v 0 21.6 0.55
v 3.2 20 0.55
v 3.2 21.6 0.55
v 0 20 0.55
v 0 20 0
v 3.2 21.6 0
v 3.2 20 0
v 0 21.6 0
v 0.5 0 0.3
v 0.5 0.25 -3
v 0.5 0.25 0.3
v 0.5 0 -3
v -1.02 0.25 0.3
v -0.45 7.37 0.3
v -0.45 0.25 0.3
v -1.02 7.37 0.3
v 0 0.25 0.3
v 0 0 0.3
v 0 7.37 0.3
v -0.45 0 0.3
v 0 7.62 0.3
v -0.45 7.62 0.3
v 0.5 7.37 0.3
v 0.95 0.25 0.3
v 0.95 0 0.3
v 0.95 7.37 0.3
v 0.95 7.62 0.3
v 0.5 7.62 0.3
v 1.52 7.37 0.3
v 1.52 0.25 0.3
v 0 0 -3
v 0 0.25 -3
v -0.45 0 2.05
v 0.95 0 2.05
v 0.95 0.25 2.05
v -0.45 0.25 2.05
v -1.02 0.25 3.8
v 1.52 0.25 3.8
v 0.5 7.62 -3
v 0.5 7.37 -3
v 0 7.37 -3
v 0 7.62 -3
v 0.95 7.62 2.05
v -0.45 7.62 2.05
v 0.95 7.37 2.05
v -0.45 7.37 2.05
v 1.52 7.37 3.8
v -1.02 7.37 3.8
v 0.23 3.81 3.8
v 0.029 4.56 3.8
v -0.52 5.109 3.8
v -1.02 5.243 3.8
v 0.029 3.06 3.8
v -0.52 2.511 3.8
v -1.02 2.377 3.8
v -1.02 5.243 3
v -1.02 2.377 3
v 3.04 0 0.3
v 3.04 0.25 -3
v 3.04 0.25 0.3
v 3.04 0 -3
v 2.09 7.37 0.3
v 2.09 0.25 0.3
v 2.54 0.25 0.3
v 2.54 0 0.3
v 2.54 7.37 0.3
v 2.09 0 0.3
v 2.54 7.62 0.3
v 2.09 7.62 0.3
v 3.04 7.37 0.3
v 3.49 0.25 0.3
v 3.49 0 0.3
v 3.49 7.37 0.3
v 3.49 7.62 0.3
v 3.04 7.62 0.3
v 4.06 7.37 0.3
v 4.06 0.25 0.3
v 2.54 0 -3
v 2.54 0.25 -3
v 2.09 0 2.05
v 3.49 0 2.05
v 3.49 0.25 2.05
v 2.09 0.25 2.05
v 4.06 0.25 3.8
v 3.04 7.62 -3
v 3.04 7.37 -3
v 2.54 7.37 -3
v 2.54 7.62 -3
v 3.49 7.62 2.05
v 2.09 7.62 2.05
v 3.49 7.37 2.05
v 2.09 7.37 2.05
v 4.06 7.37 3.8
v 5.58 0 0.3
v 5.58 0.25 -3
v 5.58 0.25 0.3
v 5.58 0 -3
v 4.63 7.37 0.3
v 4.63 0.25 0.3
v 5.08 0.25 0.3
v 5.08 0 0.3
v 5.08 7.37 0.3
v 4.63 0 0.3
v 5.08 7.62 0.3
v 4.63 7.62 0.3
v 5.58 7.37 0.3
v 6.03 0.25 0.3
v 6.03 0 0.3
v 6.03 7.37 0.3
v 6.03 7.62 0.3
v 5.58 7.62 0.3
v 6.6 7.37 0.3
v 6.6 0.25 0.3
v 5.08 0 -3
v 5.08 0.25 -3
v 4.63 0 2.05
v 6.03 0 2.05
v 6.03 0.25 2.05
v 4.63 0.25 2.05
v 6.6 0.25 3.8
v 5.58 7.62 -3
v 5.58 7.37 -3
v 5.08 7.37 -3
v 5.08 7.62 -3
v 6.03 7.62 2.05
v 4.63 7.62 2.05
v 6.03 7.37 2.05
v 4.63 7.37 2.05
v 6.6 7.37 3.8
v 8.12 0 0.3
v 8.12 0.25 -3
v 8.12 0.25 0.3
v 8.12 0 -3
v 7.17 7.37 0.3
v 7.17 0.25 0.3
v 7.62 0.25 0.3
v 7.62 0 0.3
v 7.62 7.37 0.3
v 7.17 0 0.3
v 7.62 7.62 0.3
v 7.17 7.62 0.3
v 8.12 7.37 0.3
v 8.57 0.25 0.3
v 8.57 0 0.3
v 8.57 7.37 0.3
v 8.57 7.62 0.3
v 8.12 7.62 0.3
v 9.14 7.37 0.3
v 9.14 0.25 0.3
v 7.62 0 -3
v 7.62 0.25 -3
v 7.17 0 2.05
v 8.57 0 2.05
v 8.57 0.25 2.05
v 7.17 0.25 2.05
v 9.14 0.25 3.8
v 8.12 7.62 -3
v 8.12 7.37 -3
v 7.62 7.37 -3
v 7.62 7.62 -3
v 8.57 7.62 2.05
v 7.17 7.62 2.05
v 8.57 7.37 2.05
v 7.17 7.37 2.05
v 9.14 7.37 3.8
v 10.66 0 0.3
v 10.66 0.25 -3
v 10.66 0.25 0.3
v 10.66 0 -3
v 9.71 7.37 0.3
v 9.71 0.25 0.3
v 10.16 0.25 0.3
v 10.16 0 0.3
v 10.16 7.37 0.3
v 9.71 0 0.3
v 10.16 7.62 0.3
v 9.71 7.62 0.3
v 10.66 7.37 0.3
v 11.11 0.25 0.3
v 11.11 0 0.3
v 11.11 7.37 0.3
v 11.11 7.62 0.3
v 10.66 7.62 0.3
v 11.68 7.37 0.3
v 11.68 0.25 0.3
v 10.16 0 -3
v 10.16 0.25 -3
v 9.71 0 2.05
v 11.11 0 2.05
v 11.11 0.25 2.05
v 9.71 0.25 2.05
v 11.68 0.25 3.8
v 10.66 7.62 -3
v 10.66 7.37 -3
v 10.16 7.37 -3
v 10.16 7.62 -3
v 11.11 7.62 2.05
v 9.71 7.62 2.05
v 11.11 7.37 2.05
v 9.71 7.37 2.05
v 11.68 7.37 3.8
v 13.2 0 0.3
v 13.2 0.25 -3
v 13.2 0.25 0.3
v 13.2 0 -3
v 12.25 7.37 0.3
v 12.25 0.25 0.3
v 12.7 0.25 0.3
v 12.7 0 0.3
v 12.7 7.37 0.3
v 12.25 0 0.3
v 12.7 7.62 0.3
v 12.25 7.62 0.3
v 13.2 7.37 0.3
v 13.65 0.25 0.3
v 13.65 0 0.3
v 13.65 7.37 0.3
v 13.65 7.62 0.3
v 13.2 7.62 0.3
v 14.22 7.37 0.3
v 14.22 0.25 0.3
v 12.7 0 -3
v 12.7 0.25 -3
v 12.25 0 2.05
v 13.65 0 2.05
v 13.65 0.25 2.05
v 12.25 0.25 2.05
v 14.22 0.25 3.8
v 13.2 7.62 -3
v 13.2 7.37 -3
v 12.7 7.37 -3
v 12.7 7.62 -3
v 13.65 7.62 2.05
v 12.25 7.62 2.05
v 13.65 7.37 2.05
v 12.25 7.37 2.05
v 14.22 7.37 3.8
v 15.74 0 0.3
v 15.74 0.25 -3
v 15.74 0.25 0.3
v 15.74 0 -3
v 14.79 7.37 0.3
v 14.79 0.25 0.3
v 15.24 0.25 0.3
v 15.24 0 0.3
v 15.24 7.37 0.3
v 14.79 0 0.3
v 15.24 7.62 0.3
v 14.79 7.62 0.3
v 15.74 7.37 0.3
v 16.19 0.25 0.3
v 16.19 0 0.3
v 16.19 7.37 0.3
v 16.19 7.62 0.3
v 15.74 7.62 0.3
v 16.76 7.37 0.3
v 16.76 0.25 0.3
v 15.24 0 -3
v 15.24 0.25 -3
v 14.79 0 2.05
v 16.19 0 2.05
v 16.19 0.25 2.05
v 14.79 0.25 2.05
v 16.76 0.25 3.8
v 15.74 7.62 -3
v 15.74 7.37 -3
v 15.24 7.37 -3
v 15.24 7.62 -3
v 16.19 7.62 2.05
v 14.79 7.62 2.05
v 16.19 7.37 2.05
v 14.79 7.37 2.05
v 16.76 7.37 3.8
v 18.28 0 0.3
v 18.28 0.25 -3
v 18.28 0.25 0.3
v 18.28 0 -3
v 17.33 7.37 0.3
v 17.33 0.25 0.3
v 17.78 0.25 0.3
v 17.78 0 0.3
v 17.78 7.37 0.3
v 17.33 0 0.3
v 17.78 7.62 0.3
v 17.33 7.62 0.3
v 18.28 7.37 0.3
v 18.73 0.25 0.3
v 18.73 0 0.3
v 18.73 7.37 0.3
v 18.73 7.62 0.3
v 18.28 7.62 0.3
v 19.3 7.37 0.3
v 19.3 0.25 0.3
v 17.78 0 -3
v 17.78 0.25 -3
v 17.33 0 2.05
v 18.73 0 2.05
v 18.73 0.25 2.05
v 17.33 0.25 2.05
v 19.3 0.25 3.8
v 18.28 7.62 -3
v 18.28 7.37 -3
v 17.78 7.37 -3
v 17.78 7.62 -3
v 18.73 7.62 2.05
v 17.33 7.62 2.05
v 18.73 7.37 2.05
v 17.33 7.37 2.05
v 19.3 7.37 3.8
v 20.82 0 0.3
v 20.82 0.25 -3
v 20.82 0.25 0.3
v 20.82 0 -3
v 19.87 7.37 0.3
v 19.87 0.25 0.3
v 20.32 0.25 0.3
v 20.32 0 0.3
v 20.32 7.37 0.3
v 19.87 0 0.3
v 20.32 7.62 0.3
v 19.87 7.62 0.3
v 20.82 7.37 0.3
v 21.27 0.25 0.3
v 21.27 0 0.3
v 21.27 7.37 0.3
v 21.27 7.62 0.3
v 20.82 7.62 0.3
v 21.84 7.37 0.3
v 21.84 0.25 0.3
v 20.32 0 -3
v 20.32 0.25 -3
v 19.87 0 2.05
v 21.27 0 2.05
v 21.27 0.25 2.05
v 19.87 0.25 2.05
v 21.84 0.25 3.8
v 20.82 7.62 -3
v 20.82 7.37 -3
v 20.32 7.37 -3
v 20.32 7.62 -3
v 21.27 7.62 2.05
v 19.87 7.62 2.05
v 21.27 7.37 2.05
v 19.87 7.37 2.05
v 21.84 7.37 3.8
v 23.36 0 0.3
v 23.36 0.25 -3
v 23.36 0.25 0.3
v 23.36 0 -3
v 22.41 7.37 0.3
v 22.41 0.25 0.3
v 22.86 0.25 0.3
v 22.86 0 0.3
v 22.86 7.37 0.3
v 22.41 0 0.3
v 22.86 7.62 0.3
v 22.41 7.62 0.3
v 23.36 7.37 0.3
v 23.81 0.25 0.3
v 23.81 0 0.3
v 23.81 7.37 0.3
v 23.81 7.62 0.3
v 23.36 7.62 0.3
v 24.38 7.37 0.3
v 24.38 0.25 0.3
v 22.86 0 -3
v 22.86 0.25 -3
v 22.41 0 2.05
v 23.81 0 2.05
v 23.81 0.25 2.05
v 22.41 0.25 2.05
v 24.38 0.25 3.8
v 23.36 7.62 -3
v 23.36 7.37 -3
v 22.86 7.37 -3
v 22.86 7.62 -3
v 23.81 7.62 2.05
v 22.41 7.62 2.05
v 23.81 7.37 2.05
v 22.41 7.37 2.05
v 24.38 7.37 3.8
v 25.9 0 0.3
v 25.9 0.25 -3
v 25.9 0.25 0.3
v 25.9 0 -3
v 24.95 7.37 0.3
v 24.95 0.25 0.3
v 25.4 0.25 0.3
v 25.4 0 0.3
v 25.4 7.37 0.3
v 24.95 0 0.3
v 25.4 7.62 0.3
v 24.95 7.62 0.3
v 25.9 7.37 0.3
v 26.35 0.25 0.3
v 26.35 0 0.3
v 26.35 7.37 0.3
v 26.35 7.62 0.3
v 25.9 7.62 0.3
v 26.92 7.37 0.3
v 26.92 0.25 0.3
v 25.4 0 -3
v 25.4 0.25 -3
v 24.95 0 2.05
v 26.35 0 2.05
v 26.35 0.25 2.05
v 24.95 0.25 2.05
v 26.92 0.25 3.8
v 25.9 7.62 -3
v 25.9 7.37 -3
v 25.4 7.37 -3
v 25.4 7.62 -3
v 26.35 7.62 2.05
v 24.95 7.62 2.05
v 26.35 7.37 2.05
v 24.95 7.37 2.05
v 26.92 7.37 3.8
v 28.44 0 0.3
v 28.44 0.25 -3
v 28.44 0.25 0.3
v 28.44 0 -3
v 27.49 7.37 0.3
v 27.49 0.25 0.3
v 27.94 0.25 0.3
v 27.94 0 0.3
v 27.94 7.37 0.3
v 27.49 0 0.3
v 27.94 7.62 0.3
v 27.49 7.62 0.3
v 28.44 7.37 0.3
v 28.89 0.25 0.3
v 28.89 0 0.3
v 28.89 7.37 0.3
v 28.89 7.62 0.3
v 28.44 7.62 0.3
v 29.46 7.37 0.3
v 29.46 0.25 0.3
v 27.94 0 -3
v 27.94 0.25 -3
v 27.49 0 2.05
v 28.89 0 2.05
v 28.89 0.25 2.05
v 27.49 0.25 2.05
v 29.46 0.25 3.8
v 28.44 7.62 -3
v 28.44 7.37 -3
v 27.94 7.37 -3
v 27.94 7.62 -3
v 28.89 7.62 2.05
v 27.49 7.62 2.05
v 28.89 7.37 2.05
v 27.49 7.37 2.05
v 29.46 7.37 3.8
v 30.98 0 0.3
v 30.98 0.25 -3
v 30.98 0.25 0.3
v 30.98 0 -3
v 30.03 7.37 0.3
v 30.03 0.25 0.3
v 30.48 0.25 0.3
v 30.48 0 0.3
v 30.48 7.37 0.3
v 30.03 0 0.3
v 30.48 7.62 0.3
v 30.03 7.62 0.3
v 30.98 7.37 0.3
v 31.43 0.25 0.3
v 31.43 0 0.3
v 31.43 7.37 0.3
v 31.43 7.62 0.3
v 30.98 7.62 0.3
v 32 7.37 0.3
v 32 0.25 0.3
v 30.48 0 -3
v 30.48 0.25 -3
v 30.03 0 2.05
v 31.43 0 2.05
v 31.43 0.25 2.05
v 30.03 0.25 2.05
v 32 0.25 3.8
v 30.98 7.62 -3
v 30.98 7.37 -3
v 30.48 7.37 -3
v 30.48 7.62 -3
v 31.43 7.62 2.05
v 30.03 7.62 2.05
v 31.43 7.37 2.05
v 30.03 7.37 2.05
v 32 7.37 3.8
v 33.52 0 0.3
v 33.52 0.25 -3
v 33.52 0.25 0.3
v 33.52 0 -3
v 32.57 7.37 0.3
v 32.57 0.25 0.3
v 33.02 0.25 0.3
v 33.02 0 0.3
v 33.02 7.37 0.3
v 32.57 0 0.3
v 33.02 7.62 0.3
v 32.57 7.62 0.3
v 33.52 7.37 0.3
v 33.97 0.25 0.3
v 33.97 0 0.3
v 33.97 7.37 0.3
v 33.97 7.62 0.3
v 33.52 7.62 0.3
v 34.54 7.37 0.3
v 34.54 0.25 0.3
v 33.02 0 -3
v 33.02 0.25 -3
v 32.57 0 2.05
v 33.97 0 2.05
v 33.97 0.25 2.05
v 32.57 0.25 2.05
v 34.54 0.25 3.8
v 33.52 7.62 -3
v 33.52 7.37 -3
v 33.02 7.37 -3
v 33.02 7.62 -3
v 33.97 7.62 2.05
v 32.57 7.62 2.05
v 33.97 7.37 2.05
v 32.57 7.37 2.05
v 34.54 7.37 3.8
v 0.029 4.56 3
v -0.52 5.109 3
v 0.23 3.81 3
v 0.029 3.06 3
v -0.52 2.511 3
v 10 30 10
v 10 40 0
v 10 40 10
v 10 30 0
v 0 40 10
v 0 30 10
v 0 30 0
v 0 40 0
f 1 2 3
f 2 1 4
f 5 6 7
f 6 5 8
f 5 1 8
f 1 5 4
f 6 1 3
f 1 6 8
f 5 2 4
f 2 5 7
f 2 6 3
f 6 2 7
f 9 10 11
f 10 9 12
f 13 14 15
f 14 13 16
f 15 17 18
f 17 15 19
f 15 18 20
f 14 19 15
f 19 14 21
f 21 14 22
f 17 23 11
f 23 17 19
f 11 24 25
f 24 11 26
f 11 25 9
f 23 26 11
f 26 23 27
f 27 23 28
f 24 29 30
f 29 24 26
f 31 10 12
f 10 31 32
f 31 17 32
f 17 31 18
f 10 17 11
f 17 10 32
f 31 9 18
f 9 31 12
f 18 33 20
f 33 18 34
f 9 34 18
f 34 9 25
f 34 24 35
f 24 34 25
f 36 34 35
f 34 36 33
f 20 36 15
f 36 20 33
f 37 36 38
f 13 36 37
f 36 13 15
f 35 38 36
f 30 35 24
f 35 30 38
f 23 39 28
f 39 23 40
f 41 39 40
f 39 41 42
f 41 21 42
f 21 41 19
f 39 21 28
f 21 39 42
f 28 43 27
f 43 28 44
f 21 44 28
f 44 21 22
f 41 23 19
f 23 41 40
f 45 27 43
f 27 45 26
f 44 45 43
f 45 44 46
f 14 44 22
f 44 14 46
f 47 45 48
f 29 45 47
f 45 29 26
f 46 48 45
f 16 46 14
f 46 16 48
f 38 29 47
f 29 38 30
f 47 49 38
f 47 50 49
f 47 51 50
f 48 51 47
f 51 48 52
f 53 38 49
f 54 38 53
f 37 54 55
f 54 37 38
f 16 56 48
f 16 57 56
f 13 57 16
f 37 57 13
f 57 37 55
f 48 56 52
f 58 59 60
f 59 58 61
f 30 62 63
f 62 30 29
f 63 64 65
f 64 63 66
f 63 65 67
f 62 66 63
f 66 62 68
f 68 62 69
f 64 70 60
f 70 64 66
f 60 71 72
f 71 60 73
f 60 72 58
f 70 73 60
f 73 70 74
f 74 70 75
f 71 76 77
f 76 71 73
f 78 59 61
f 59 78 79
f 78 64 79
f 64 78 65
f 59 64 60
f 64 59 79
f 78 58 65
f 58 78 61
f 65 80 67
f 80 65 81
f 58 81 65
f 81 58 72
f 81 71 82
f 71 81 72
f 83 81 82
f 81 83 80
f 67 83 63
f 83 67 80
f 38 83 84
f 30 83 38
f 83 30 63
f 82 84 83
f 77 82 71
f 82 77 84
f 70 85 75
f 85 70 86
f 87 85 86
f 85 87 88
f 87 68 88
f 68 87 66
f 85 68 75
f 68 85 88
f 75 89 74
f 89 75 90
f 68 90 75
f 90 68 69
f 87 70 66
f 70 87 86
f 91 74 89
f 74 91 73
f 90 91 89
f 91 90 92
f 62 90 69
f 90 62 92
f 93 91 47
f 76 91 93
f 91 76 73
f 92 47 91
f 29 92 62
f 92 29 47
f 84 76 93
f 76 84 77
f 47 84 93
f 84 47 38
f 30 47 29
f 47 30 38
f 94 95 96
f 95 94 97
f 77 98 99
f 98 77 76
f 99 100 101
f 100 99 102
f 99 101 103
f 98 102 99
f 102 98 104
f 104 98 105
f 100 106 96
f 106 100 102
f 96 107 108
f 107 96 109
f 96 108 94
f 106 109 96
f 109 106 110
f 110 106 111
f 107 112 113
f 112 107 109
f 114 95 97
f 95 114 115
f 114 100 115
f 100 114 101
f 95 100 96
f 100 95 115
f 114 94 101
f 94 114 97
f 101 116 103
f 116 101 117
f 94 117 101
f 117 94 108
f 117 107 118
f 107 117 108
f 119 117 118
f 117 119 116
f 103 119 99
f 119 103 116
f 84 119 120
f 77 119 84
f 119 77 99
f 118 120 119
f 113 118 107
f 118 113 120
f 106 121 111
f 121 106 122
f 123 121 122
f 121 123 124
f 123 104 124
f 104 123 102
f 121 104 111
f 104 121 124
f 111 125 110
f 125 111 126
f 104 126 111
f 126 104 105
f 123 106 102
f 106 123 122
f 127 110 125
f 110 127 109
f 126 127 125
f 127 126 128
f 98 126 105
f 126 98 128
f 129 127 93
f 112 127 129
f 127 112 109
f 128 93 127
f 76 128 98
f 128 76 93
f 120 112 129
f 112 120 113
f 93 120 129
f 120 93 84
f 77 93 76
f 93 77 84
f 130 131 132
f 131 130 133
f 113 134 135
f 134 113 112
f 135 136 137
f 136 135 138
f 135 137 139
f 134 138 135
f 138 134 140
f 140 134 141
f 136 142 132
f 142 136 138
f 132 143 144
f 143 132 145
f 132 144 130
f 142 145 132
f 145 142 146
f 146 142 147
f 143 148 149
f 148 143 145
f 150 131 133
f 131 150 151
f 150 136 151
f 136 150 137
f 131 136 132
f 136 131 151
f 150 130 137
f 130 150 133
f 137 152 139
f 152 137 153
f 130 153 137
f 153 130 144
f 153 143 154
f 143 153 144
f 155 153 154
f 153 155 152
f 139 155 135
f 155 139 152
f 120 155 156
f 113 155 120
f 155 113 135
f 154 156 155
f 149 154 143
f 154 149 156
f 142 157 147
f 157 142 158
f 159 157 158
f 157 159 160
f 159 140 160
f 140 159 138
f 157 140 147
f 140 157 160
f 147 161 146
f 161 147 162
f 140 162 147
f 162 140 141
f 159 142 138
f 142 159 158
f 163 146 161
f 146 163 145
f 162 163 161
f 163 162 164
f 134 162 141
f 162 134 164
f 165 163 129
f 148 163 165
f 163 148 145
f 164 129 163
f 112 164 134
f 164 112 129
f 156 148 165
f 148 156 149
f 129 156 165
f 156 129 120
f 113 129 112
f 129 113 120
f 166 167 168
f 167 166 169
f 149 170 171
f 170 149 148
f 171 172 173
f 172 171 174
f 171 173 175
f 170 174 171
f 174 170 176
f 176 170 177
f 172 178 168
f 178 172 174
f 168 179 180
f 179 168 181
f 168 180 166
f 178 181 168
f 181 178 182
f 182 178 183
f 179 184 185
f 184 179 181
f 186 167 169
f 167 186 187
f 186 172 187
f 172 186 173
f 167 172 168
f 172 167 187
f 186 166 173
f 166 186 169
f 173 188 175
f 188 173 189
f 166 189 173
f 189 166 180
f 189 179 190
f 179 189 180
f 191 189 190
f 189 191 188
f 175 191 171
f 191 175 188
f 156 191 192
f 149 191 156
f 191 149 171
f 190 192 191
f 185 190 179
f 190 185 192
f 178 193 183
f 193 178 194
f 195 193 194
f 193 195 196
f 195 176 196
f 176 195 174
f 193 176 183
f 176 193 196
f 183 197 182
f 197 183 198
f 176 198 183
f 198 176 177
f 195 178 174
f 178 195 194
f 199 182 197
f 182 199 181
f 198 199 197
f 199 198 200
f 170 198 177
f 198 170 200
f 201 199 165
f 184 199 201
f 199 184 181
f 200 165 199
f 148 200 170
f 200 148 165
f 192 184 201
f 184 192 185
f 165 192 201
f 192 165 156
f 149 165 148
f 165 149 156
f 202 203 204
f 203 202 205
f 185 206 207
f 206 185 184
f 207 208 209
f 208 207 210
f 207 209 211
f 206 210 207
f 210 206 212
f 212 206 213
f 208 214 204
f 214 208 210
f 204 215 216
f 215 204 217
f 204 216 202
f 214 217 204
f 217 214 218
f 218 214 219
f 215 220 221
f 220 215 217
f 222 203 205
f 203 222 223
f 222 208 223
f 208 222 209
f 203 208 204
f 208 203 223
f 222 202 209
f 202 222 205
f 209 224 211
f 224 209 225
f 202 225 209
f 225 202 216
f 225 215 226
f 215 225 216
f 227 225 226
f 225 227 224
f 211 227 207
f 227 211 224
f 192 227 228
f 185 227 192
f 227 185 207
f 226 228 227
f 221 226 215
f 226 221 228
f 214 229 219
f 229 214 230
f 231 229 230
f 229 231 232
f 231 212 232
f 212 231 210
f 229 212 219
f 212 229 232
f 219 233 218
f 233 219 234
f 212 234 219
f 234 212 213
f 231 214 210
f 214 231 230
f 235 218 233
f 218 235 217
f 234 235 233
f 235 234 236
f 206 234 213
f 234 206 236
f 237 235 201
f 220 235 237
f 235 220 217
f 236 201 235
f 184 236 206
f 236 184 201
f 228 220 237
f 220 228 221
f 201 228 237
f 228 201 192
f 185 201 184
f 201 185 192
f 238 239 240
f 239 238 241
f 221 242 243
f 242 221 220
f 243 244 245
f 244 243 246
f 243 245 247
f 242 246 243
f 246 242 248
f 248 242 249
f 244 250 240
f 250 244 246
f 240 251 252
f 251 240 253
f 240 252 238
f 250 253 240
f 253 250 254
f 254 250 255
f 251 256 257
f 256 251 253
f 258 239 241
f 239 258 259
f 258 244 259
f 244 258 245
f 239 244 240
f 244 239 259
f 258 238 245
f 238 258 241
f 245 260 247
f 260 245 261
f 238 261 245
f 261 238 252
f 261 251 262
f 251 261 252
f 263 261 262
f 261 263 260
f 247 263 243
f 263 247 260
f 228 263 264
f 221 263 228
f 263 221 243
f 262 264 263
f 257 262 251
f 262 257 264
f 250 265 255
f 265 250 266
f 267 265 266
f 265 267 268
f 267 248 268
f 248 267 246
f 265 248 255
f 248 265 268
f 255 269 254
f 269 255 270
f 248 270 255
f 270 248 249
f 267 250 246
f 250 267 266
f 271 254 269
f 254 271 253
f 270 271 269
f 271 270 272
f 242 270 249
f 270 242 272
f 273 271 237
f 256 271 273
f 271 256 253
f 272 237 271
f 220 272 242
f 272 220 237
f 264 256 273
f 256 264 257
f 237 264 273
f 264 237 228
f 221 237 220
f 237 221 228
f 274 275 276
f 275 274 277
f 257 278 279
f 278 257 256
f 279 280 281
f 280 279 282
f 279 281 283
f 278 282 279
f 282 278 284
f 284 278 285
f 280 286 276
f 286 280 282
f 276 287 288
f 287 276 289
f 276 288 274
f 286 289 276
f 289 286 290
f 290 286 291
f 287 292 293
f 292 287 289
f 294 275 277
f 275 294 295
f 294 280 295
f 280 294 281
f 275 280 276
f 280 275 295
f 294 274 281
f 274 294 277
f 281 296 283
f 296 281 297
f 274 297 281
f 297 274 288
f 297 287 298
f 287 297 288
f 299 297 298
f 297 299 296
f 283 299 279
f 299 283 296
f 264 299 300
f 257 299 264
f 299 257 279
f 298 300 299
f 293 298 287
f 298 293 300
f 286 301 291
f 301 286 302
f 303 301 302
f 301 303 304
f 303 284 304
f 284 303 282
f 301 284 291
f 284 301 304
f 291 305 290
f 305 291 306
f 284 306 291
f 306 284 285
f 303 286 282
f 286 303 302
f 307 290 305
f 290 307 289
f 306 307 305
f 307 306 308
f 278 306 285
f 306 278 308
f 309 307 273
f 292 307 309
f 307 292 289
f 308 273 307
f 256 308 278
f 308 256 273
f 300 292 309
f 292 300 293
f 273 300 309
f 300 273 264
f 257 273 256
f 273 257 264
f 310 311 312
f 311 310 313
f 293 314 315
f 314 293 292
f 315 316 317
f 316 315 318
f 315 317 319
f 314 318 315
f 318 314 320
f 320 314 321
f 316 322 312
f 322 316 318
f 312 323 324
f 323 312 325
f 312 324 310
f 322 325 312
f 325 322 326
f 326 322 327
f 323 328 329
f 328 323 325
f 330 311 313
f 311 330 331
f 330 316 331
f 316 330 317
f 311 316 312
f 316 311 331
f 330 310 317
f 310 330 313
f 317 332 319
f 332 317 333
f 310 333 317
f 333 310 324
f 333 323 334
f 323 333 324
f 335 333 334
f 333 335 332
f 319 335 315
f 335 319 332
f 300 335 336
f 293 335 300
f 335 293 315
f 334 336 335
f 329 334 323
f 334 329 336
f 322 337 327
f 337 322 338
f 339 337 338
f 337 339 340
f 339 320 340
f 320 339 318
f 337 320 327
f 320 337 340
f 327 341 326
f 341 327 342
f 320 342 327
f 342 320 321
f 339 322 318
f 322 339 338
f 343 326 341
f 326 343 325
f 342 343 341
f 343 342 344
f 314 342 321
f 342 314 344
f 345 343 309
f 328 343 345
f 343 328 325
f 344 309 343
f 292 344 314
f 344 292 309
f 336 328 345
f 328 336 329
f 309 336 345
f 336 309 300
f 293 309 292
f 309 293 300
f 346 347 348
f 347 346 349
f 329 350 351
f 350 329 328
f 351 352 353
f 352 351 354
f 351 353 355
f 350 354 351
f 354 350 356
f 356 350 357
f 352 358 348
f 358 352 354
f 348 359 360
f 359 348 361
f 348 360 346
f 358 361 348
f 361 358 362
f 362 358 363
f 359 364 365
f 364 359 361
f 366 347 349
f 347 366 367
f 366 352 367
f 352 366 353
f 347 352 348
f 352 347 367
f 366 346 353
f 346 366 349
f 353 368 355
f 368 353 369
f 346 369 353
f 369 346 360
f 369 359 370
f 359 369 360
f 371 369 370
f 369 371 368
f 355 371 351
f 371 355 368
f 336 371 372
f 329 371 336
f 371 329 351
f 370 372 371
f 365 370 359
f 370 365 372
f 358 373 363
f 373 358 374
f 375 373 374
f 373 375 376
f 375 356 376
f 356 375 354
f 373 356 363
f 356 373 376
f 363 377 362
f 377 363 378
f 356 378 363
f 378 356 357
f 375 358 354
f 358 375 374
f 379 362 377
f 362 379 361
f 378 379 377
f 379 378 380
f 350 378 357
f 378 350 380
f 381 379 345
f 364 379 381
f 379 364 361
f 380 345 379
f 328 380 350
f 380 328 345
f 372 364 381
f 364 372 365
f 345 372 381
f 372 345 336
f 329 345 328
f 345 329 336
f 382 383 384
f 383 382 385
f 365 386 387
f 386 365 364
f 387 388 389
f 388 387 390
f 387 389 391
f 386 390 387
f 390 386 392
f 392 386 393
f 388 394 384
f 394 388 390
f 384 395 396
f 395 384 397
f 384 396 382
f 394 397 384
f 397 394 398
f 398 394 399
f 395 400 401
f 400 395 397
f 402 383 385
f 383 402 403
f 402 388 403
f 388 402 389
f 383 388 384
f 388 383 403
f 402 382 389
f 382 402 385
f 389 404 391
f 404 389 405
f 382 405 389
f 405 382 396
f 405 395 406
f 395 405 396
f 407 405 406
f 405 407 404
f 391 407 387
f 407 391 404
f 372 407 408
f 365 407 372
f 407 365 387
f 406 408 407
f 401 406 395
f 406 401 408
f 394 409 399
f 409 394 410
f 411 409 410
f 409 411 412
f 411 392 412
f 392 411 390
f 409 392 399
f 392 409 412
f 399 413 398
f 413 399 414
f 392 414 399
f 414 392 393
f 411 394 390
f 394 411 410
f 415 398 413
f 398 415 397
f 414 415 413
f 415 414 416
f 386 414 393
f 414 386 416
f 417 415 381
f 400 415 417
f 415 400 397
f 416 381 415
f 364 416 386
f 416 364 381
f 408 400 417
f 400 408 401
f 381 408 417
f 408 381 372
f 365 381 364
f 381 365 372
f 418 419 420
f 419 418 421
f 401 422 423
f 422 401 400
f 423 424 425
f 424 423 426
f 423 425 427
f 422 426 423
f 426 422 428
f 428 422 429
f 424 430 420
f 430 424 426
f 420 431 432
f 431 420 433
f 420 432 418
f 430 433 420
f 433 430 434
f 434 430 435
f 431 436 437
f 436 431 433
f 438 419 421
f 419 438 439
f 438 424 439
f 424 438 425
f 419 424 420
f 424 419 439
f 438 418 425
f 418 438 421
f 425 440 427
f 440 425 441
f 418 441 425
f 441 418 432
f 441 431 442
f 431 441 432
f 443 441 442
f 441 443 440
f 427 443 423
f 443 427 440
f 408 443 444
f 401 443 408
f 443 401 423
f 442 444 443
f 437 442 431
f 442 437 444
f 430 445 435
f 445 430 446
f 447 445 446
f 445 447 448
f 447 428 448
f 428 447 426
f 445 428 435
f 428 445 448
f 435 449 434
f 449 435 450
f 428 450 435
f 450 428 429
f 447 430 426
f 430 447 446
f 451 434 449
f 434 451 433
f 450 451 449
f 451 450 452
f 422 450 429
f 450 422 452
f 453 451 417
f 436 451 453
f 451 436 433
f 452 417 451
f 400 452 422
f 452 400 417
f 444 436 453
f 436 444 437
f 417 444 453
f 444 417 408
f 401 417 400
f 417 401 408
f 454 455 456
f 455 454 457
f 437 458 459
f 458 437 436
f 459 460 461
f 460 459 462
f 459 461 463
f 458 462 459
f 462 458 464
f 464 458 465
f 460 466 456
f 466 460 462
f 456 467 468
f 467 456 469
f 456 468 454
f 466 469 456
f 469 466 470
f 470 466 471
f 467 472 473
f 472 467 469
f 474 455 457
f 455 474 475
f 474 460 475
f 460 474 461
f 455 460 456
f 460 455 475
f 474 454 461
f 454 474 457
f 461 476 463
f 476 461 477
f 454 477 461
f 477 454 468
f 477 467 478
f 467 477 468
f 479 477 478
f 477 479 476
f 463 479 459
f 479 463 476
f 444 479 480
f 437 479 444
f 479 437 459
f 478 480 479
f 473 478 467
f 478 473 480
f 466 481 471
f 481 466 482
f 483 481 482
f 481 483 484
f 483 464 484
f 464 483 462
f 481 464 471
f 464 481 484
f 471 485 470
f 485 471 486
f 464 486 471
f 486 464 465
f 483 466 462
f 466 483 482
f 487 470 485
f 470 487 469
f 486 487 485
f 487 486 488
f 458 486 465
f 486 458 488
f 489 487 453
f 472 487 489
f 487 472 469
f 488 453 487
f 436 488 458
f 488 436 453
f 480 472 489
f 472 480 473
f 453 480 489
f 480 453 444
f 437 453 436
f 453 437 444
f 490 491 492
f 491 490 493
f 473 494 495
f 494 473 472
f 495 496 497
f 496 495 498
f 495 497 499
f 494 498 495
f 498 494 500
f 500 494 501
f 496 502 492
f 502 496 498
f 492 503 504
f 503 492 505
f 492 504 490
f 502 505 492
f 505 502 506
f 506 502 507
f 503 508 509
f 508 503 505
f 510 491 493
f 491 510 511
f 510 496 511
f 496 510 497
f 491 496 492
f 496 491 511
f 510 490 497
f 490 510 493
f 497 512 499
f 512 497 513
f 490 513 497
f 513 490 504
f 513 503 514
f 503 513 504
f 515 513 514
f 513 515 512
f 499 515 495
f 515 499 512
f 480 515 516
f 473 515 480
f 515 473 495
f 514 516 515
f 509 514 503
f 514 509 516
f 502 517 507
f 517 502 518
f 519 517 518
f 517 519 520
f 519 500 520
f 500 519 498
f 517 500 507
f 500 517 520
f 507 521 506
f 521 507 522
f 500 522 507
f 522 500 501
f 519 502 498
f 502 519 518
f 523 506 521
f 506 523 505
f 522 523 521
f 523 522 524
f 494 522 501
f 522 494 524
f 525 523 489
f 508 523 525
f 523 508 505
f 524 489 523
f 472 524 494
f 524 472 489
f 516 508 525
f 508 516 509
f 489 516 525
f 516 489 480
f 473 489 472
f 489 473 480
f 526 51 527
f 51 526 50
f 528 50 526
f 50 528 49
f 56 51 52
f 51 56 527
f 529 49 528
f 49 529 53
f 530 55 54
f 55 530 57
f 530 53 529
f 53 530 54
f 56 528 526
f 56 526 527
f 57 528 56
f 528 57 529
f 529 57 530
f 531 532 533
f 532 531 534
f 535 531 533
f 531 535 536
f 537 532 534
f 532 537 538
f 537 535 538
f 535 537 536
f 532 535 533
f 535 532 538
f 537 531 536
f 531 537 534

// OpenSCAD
//
// Models for various electronic components
//

//--------------------------------------------------------------------------------------
//  Models for various DIPs.
//
//  A single 2-pin DIP module.  The complete DIP is a collection of these strung together.
//  Note that the width is in mm.
module bbs_DIP_temp(width)
{
  translate([0, 0, 0]) color("silver") cube([0.5, 0.25, 3.3]);
  translate([-0.45, 0, 3.3]) color("silver") cube([1.4, 0.25, 3.5/2]);
  translate([0, width-0.25, 0]) color("silver") cube([0.5, 0.25, 3.3]);
  translate([-0.45, width-0.25, 3.3]) color("silver") cube([1.4, 0.25, 3.5/2]);
  translate([-1.02, 0.25, 3.3]) color("black") cube([2.54, width-0.5, 3.5]);
}
//
//  Module for a standard DIP package.
//  Note that the width is in inches.  Expected values are 0.3 and 0.6.
module bbs_DIP(pins, width)
{
  difference()
  {
    for(a = [0:(pins/2)-1])
    {
      translate([a*2.54, 0, -3]) bbs_DIP_temp(width*25.4);
    }
    translate([-2.54/2, (width*25.4)/2, 3]) cylinder(h=10, r=1.5, $fn=12);
  }
}

//--------------------------------------------------------------------------------------
//  Model for SMD resistors
//  The following sizes are supported 0201, 0402, 0603, 0805, 1206, 1210, 1812, 2010, 2512.
//  Specify the size as a string.
module bbs_SMD_resistor(size)
{
  sizes = [
  ["0201", 0.60, 0.30, 0.25],
  ["0402", 1.00, 0.50, 0.35],
  ["0603", 1.55, 0.85, 0.45],
  ["0805", 2.00, 1.20, 0.45],
  ["1206", 3.20, 1.60, 0.55],
  ["1210", 3.20, 2.50, 0.55],
  ["1812", 3.20, 4.60, 0.55],
  ["2010", 5.00, 2.50, 0.60],
  ["2512", 6.30, 3.20, 0.60]];
  index = search([size], sizes, 1, 0);
  if (size == sizes[index[0]][0])
  {
    entry = sizes[index[0]];
    color("silver") cube([0.05, entry[2], entry[3]]);
    color("silver") translate([entry[1]-0.05, 0, 0]) cube([0.05, entry[2], entry[3]]);
    color("black") translate([0.05, 0, 0]) cube([entry[1]-0.1, entry[2], entry[3]]);
  }
  else
  {
    echo(str("ERROR: SMD Resistor size ", size, " not found"));
    color("red") cube([10, 10, 10]);
  }
}

translate([0, 20, 0]) bbs_SMD_resistor("1206");
translate([0, 30, 0]) bbs_SMD_resistor("1234");

bbs_DIP(28, 0.3);
